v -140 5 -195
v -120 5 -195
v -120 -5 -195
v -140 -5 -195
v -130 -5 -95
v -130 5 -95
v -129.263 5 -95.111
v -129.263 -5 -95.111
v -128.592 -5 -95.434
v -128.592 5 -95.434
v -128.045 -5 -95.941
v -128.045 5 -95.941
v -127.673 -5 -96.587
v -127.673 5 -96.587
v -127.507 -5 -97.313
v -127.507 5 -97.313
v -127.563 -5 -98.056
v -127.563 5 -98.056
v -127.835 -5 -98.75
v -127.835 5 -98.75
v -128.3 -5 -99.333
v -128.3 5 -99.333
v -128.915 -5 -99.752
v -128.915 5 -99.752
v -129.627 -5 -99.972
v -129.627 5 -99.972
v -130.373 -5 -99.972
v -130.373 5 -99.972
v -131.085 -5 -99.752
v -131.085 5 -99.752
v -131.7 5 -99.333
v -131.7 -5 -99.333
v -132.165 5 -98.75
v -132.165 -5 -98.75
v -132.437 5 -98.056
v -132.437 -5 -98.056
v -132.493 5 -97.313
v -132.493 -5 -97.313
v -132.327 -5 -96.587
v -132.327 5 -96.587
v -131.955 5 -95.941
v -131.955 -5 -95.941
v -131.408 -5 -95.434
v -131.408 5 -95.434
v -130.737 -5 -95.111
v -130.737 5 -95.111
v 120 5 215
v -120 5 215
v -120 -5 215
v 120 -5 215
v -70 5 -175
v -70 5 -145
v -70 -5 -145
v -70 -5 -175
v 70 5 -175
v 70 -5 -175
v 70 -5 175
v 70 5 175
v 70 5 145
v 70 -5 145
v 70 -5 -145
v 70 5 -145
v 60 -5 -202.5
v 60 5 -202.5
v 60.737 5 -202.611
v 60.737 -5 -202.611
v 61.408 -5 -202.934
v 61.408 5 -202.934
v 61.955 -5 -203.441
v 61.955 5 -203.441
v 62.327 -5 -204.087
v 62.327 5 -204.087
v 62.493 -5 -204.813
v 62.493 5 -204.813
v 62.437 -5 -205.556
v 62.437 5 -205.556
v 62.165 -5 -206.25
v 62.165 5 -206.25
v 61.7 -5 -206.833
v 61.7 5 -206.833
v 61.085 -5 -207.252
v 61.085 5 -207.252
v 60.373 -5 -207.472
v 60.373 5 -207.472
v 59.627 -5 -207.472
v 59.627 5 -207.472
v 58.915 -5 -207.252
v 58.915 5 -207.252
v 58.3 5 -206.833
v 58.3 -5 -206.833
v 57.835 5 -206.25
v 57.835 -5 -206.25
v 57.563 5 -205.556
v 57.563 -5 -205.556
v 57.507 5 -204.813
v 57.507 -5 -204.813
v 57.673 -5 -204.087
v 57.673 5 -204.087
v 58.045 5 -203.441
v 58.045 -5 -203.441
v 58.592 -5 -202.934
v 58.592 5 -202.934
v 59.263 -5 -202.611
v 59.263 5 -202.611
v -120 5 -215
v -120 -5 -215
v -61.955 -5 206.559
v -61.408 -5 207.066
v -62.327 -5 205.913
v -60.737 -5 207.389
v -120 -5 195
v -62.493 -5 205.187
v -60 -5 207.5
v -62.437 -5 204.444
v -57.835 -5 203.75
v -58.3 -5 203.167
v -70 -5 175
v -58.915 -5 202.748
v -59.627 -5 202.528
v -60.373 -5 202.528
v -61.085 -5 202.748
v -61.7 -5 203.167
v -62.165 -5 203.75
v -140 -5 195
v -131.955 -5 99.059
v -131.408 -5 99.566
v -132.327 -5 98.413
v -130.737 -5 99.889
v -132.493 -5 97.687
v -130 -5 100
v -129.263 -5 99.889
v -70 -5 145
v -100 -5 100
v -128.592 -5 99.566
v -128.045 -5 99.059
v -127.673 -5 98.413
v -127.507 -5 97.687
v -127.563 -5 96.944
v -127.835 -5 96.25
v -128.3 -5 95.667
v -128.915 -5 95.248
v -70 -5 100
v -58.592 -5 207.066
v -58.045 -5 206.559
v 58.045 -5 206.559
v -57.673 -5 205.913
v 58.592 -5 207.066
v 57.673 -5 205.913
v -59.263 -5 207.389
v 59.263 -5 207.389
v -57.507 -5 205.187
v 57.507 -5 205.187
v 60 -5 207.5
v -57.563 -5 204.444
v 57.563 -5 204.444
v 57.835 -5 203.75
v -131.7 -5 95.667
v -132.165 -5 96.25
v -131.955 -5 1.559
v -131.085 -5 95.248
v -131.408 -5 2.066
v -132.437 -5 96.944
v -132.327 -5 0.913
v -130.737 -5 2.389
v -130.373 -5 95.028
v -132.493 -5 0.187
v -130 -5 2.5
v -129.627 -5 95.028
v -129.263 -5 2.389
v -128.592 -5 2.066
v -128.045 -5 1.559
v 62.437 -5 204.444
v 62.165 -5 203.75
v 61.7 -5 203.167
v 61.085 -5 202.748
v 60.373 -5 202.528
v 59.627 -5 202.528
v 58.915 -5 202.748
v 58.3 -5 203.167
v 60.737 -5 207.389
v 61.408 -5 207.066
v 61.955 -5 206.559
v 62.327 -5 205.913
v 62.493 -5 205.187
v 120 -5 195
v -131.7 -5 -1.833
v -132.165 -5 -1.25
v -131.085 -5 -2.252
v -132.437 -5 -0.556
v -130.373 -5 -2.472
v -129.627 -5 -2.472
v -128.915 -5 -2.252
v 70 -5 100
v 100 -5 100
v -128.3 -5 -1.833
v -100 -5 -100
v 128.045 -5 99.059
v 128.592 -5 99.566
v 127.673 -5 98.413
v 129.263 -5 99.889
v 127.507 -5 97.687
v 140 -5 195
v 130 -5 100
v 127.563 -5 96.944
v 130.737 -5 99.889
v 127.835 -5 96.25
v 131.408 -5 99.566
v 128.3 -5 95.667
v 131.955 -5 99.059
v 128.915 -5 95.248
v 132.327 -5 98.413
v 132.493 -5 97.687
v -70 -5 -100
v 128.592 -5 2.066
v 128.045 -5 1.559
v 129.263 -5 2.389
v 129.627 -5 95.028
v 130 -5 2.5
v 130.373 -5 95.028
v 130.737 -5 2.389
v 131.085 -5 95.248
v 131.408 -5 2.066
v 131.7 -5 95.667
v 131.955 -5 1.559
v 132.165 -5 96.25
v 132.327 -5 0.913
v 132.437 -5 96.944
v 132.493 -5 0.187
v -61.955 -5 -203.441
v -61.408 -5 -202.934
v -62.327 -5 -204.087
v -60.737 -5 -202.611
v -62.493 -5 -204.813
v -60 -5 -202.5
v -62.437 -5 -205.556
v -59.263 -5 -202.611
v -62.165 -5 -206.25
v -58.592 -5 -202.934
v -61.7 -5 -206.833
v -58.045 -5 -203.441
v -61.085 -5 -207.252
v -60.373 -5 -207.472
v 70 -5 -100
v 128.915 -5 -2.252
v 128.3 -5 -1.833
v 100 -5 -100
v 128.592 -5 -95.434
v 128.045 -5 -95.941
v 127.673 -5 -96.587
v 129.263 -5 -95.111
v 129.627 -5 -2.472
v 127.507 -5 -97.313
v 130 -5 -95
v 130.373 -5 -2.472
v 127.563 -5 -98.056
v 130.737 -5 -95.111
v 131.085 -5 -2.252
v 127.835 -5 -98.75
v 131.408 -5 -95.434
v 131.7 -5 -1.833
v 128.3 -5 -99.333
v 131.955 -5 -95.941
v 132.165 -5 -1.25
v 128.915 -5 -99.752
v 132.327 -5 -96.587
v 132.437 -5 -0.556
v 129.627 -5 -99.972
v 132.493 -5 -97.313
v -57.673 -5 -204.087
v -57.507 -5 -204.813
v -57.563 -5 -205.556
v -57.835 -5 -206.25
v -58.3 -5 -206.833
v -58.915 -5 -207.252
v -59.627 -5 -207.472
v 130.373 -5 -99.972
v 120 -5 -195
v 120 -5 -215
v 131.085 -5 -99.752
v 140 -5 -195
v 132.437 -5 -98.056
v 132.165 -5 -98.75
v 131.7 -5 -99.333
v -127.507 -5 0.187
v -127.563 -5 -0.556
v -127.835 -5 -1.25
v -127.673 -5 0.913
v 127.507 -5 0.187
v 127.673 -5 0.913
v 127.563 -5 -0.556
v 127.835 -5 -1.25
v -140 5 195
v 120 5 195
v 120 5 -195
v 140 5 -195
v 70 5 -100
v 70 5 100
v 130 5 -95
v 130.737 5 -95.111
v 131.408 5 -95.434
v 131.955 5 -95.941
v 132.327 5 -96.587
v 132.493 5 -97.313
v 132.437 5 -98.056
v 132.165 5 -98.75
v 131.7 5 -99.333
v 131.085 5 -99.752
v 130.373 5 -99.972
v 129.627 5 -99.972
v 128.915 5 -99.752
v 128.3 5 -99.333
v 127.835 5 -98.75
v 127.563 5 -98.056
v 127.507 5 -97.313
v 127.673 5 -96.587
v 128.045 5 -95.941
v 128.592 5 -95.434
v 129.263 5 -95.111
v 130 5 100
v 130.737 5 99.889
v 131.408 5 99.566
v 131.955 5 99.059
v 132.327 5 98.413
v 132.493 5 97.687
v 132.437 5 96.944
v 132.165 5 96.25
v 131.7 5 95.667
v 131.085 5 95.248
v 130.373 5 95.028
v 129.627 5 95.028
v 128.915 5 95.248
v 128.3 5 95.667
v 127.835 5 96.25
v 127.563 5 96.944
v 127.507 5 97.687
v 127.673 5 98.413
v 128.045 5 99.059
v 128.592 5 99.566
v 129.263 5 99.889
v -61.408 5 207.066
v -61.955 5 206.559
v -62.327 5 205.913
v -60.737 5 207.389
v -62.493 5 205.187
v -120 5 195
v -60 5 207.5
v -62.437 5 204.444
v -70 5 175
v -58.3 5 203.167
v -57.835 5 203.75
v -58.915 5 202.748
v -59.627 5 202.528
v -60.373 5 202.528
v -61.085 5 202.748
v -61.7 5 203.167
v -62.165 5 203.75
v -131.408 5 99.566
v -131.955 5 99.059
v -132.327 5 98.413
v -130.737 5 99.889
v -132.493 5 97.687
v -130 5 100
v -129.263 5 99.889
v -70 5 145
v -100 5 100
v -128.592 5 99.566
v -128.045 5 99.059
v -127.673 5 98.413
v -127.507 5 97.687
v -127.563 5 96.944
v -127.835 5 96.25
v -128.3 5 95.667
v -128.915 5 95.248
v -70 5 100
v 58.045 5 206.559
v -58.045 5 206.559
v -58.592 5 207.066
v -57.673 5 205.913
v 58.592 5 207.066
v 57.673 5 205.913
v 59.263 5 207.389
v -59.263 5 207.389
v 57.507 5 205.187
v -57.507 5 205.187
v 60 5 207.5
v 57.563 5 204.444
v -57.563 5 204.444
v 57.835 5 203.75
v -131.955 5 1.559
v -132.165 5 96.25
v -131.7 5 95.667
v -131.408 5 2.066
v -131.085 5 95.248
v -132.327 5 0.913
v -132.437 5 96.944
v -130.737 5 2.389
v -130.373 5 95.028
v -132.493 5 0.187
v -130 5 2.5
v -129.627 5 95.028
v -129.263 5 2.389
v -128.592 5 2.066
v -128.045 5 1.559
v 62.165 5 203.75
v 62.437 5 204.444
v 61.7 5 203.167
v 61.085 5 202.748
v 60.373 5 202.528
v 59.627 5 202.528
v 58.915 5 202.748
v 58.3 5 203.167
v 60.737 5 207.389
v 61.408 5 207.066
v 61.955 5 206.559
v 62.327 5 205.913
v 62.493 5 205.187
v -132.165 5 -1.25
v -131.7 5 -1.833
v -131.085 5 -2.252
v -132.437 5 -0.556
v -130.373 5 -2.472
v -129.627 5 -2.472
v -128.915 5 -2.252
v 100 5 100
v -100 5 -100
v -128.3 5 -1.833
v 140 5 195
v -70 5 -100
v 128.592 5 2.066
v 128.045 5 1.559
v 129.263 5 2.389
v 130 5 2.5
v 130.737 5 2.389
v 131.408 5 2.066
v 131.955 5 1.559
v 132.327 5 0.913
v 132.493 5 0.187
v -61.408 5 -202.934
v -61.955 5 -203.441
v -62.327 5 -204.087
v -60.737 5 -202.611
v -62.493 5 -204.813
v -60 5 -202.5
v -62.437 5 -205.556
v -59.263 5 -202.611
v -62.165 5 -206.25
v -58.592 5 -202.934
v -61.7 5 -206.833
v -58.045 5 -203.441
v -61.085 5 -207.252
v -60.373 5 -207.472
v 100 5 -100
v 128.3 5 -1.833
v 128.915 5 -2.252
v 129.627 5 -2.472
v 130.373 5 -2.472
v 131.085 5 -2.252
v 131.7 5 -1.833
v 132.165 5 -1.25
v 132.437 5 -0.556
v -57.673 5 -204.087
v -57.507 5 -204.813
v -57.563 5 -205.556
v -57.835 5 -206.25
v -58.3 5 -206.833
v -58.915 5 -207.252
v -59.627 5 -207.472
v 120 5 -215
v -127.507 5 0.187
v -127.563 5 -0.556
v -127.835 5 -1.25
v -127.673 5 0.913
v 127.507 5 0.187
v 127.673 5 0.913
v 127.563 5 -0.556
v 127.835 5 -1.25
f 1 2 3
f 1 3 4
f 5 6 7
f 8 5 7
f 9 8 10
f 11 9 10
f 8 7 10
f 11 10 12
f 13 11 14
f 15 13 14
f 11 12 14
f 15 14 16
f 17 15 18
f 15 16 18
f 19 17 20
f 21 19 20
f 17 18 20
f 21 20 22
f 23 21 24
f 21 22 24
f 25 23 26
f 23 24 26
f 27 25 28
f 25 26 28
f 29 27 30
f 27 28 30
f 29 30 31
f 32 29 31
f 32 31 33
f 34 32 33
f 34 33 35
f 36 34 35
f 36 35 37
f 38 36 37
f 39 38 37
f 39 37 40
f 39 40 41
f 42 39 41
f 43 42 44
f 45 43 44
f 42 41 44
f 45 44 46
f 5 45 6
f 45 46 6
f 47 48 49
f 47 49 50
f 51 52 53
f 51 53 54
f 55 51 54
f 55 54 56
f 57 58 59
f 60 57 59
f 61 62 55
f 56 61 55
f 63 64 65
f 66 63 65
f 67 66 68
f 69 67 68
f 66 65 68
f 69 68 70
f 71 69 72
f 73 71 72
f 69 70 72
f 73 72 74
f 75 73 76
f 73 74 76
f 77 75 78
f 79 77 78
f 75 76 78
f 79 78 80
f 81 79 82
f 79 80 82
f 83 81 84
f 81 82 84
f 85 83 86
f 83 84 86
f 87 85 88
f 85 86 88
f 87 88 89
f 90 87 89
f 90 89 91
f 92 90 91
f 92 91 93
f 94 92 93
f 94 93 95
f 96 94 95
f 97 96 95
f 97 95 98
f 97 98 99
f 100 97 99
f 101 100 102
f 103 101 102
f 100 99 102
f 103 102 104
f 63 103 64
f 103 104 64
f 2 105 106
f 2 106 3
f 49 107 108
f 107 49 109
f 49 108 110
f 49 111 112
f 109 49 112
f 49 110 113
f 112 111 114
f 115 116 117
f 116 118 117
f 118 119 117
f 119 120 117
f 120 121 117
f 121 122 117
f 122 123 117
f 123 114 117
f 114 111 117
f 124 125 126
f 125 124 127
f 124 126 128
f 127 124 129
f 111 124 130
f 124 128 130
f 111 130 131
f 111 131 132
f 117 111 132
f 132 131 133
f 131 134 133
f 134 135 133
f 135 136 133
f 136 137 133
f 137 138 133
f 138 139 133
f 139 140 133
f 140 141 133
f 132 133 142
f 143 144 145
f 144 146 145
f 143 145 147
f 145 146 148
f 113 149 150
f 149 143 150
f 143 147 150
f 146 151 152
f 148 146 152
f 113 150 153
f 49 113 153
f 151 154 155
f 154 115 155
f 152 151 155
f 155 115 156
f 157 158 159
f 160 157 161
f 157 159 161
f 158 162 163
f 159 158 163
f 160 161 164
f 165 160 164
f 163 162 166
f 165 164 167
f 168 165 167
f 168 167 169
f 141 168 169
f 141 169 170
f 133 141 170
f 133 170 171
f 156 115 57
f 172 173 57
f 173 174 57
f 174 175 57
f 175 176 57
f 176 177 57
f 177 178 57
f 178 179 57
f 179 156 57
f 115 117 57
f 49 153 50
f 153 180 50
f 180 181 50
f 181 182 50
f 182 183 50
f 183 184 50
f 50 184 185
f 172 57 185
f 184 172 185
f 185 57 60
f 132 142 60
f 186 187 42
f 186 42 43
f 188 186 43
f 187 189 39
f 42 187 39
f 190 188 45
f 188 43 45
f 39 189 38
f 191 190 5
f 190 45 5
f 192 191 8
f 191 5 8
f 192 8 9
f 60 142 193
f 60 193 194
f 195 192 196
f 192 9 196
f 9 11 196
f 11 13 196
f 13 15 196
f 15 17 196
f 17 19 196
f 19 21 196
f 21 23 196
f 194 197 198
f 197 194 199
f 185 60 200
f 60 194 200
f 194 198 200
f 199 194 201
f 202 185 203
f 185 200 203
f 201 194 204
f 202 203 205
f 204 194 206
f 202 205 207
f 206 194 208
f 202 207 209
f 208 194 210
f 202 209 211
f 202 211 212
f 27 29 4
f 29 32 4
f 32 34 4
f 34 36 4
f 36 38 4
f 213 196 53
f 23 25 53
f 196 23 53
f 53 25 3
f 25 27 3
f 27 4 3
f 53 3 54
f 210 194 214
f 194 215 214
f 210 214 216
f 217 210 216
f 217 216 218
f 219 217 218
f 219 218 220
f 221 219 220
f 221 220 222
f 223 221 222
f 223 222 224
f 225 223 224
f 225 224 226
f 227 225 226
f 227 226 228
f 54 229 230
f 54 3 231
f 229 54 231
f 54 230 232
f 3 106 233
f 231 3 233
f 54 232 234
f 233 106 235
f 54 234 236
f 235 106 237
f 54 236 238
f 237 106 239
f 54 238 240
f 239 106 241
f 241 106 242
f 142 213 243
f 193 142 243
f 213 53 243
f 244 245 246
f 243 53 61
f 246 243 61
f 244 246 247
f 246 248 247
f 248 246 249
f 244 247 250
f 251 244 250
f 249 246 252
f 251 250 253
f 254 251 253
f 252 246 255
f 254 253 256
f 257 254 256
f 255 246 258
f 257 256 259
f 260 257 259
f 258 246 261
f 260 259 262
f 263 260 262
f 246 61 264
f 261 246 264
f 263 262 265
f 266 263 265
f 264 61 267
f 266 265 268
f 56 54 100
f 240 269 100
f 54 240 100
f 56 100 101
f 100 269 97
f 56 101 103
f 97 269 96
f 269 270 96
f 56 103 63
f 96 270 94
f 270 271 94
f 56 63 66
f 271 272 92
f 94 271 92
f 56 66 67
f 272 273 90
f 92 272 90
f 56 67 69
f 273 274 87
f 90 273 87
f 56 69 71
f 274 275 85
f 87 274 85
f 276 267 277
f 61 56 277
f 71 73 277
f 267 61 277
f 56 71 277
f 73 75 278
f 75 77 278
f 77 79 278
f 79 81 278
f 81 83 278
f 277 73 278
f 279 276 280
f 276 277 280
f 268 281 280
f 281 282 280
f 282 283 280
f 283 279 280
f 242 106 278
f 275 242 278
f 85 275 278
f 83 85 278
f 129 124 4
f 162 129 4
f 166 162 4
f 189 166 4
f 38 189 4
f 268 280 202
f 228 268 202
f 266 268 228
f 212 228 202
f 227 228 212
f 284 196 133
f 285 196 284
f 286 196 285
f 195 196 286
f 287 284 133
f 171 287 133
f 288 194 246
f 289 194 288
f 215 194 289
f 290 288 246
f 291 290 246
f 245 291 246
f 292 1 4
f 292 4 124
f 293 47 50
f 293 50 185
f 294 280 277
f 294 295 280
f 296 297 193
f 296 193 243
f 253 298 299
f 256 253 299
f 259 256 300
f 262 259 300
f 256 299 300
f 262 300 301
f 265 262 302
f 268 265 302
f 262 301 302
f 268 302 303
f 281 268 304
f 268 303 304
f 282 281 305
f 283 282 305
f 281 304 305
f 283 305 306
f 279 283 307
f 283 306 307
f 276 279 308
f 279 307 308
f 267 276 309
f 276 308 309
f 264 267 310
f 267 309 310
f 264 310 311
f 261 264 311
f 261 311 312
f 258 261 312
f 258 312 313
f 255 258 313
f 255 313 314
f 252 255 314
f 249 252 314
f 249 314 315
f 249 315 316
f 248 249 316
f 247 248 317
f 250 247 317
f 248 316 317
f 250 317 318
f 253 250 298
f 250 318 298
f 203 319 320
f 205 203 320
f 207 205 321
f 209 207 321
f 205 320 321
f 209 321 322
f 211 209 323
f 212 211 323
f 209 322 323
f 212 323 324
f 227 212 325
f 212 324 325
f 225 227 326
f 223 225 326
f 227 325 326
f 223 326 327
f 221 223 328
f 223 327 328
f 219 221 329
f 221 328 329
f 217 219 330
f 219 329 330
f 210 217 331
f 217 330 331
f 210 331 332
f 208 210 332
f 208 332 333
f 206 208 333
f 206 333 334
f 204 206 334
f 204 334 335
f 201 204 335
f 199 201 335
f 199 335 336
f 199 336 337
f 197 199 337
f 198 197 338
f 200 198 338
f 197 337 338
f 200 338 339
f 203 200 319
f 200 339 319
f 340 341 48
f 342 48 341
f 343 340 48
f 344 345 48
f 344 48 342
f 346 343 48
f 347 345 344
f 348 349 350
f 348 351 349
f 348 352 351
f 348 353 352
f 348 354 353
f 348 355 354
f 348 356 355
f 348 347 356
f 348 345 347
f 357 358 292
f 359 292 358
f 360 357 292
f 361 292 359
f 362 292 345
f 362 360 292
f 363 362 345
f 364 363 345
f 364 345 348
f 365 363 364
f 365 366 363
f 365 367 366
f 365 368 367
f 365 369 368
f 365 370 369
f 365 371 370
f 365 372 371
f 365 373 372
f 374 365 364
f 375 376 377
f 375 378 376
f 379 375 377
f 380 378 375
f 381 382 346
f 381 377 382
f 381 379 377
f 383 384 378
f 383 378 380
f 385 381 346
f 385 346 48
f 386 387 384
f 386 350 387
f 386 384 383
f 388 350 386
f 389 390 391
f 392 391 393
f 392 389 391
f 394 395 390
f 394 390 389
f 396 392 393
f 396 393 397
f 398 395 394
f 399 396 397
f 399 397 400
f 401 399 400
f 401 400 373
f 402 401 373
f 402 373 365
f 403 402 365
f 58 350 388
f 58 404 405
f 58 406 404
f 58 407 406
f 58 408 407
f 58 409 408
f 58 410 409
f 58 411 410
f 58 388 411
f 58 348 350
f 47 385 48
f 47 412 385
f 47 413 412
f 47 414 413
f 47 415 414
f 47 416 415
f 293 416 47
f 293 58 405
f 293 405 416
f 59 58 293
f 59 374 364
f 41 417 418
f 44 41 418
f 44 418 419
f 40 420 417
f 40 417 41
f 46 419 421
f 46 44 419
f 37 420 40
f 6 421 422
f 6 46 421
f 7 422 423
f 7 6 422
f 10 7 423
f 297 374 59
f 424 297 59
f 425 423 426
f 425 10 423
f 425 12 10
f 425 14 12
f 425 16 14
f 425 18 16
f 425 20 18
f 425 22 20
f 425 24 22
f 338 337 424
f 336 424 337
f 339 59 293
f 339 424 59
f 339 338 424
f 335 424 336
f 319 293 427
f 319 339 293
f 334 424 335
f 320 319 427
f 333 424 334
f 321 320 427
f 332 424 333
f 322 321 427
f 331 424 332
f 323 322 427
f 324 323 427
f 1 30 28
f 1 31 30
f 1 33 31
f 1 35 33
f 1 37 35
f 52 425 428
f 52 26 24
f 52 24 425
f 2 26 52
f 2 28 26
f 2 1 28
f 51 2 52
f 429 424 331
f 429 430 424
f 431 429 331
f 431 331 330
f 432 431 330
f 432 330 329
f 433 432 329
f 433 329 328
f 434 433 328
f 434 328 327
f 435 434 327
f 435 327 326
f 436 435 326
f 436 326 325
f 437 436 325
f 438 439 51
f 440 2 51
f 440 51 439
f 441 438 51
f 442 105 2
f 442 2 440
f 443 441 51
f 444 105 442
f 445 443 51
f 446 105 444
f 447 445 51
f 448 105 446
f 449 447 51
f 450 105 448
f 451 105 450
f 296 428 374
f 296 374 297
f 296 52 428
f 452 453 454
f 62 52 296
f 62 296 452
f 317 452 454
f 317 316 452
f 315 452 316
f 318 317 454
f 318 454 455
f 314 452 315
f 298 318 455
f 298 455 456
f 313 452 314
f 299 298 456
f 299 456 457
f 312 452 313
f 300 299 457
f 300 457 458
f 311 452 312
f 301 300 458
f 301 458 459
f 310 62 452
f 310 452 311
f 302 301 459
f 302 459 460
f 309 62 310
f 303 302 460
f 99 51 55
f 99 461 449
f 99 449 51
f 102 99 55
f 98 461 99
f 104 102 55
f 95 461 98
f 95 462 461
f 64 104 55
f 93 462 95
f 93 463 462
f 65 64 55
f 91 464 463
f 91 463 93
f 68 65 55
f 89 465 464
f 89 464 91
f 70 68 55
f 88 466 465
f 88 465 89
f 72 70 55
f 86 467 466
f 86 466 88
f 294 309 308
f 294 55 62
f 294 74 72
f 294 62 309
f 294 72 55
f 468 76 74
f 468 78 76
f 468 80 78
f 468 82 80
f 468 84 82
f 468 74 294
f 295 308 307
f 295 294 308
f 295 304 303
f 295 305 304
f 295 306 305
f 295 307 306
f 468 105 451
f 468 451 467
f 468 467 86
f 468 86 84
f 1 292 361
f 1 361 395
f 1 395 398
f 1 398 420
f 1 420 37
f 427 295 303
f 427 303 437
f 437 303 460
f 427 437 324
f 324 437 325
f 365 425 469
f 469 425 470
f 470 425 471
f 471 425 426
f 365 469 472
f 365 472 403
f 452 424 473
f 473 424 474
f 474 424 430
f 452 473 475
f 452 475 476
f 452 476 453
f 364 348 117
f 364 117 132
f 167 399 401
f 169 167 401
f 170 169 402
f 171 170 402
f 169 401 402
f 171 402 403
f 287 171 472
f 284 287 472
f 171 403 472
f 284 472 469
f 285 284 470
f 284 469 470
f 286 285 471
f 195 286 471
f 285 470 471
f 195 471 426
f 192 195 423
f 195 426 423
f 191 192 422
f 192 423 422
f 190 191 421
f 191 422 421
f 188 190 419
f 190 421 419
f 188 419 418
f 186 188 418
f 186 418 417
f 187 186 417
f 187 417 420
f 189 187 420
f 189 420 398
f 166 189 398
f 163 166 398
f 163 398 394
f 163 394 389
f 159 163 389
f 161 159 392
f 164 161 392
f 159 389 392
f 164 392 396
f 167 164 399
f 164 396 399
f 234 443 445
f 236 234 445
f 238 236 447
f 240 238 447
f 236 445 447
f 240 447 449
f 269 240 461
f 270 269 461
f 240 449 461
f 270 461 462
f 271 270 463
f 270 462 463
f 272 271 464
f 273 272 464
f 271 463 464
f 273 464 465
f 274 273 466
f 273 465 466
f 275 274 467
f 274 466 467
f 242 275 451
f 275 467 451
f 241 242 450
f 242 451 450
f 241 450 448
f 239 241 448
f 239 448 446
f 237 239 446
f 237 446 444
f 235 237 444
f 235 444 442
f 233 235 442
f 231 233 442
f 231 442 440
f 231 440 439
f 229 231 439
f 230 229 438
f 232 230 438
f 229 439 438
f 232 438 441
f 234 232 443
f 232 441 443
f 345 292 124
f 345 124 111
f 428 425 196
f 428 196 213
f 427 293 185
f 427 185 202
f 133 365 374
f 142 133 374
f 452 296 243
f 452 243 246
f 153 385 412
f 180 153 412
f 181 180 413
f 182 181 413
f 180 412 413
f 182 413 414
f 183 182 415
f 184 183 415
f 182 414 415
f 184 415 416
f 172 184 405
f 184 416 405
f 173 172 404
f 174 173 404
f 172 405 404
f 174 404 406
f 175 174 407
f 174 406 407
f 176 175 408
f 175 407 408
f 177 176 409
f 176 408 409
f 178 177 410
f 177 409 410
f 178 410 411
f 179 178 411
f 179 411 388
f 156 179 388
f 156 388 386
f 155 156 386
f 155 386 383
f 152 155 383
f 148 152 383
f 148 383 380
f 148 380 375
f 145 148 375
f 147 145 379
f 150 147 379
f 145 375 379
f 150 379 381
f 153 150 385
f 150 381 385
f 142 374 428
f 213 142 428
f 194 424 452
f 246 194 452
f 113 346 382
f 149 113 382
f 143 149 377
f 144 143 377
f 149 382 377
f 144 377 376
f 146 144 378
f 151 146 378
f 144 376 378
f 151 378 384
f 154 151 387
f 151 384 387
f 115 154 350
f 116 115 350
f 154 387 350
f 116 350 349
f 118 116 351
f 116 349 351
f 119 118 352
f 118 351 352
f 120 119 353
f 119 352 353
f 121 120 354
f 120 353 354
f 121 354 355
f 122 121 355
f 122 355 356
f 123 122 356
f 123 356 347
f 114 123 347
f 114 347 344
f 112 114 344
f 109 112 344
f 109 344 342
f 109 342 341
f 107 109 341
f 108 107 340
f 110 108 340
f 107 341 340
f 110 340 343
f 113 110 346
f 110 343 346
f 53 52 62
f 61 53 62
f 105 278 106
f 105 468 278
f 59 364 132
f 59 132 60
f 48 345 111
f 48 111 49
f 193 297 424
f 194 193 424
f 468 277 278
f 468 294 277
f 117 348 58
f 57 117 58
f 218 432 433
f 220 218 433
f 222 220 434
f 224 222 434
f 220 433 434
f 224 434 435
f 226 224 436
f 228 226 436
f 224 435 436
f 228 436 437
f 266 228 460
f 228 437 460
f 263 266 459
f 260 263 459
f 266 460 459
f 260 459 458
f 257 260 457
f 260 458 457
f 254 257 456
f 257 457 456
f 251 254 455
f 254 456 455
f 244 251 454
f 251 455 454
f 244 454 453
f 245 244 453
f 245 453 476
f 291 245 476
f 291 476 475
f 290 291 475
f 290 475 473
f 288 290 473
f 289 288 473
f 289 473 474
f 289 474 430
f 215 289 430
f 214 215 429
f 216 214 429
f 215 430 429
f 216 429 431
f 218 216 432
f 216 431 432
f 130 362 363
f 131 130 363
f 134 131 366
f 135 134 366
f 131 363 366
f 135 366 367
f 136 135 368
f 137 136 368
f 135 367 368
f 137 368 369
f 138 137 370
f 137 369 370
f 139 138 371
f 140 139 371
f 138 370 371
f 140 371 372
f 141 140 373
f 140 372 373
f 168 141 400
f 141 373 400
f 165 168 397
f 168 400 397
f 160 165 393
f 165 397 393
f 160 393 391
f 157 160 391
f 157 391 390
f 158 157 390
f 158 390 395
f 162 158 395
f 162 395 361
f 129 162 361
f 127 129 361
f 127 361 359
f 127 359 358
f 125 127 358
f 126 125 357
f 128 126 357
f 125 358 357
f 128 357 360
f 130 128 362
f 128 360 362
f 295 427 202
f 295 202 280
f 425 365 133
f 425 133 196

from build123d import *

# Parameters (mm, degrees)
BOSS_EXTRUDE1_DEPTH = 5
SKETCH2_R           = 2.5
SKETCH2_W           = 30
SKETCH2_H           = 200
SKETCH2_W_2         = 140
SKETCH2_H_2         = 30
CUT_EXTRUDE1_DEPTH  = 10


with BuildPart() as part:
    # Sketch1 → Boss-Extrude1 (new, symmetric)
    with BuildSketch(Plane(origin=(0, 0, 0), x_dir=(1, 0, 0), z_dir=(0, 1, 0))):
        Polygon((120, 215), (-120, 215), (-120, 195), (-140, 195), (-140, -195), (-120, -195), (-120, -215), (120, -215), (120, -195), (140, -195), (140, 195), (120, 195), align=None)
    extrude(amount=BOSS_EXTRUDE1_DEPTH, both=True)

    # Sketch2 → Cut-Extrude1 (cut)
    with BuildSketch(Plane(origin=(0, 5, 0), x_dir=(1, 0, 0), z_dir=(0, 1, 0))):
        with Locations(Location((-60, 205, 0), (0, 0, 270))):
            Circle(SKETCH2_R)
        with Locations(Location((60, 205, 0), (0, 0, 270))):
            Circle(SKETCH2_R)
        with Locations(Location((130, 97.5, 0), (0, 0, 270))):
            Circle(SKETCH2_R)
        with Locations(Location((130, -97.5, 0), (0, 0, 270))):
            Circle(SKETCH2_R)
        with Locations(Location((130, 0, 0), (0, 0, 270))):
            Circle(SKETCH2_R)
        with Locations(Location((60, -205, 0), (0, 0, 270))):
            Circle(SKETCH2_R)
        with Locations(Location((-60, -205, 0), (0, 0, 270))):
            Circle(SKETCH2_R)
        with Locations(Location((-130, 97.5, 0), (0, 0, 270))):
            Circle(SKETCH2_R)
        with Locations(Location((-130, 0, 0), (0, 0, 270))):
            Circle(SKETCH2_R)
        with Locations(Location((-130, -97.5, 0), (0, 0, 270))):
            Circle(SKETCH2_R)
        with Locations((85, 0)):
            Rectangle(SKETCH2_W, SKETCH2_H)
        with Locations((-85, 0)):
            Rectangle(SKETCH2_W, SKETCH2_H)
        with Locations((0, 160)):
            Rectangle(SKETCH2_W_2, SKETCH2_H_2)
        with Locations((0, -160)):
            Rectangle(SKETCH2_W_2, SKETCH2_H_2)
    extrude(amount=-CUT_EXTRUDE1_DEPTH, mode=Mode.SUBTRACT)


solid = part.part
